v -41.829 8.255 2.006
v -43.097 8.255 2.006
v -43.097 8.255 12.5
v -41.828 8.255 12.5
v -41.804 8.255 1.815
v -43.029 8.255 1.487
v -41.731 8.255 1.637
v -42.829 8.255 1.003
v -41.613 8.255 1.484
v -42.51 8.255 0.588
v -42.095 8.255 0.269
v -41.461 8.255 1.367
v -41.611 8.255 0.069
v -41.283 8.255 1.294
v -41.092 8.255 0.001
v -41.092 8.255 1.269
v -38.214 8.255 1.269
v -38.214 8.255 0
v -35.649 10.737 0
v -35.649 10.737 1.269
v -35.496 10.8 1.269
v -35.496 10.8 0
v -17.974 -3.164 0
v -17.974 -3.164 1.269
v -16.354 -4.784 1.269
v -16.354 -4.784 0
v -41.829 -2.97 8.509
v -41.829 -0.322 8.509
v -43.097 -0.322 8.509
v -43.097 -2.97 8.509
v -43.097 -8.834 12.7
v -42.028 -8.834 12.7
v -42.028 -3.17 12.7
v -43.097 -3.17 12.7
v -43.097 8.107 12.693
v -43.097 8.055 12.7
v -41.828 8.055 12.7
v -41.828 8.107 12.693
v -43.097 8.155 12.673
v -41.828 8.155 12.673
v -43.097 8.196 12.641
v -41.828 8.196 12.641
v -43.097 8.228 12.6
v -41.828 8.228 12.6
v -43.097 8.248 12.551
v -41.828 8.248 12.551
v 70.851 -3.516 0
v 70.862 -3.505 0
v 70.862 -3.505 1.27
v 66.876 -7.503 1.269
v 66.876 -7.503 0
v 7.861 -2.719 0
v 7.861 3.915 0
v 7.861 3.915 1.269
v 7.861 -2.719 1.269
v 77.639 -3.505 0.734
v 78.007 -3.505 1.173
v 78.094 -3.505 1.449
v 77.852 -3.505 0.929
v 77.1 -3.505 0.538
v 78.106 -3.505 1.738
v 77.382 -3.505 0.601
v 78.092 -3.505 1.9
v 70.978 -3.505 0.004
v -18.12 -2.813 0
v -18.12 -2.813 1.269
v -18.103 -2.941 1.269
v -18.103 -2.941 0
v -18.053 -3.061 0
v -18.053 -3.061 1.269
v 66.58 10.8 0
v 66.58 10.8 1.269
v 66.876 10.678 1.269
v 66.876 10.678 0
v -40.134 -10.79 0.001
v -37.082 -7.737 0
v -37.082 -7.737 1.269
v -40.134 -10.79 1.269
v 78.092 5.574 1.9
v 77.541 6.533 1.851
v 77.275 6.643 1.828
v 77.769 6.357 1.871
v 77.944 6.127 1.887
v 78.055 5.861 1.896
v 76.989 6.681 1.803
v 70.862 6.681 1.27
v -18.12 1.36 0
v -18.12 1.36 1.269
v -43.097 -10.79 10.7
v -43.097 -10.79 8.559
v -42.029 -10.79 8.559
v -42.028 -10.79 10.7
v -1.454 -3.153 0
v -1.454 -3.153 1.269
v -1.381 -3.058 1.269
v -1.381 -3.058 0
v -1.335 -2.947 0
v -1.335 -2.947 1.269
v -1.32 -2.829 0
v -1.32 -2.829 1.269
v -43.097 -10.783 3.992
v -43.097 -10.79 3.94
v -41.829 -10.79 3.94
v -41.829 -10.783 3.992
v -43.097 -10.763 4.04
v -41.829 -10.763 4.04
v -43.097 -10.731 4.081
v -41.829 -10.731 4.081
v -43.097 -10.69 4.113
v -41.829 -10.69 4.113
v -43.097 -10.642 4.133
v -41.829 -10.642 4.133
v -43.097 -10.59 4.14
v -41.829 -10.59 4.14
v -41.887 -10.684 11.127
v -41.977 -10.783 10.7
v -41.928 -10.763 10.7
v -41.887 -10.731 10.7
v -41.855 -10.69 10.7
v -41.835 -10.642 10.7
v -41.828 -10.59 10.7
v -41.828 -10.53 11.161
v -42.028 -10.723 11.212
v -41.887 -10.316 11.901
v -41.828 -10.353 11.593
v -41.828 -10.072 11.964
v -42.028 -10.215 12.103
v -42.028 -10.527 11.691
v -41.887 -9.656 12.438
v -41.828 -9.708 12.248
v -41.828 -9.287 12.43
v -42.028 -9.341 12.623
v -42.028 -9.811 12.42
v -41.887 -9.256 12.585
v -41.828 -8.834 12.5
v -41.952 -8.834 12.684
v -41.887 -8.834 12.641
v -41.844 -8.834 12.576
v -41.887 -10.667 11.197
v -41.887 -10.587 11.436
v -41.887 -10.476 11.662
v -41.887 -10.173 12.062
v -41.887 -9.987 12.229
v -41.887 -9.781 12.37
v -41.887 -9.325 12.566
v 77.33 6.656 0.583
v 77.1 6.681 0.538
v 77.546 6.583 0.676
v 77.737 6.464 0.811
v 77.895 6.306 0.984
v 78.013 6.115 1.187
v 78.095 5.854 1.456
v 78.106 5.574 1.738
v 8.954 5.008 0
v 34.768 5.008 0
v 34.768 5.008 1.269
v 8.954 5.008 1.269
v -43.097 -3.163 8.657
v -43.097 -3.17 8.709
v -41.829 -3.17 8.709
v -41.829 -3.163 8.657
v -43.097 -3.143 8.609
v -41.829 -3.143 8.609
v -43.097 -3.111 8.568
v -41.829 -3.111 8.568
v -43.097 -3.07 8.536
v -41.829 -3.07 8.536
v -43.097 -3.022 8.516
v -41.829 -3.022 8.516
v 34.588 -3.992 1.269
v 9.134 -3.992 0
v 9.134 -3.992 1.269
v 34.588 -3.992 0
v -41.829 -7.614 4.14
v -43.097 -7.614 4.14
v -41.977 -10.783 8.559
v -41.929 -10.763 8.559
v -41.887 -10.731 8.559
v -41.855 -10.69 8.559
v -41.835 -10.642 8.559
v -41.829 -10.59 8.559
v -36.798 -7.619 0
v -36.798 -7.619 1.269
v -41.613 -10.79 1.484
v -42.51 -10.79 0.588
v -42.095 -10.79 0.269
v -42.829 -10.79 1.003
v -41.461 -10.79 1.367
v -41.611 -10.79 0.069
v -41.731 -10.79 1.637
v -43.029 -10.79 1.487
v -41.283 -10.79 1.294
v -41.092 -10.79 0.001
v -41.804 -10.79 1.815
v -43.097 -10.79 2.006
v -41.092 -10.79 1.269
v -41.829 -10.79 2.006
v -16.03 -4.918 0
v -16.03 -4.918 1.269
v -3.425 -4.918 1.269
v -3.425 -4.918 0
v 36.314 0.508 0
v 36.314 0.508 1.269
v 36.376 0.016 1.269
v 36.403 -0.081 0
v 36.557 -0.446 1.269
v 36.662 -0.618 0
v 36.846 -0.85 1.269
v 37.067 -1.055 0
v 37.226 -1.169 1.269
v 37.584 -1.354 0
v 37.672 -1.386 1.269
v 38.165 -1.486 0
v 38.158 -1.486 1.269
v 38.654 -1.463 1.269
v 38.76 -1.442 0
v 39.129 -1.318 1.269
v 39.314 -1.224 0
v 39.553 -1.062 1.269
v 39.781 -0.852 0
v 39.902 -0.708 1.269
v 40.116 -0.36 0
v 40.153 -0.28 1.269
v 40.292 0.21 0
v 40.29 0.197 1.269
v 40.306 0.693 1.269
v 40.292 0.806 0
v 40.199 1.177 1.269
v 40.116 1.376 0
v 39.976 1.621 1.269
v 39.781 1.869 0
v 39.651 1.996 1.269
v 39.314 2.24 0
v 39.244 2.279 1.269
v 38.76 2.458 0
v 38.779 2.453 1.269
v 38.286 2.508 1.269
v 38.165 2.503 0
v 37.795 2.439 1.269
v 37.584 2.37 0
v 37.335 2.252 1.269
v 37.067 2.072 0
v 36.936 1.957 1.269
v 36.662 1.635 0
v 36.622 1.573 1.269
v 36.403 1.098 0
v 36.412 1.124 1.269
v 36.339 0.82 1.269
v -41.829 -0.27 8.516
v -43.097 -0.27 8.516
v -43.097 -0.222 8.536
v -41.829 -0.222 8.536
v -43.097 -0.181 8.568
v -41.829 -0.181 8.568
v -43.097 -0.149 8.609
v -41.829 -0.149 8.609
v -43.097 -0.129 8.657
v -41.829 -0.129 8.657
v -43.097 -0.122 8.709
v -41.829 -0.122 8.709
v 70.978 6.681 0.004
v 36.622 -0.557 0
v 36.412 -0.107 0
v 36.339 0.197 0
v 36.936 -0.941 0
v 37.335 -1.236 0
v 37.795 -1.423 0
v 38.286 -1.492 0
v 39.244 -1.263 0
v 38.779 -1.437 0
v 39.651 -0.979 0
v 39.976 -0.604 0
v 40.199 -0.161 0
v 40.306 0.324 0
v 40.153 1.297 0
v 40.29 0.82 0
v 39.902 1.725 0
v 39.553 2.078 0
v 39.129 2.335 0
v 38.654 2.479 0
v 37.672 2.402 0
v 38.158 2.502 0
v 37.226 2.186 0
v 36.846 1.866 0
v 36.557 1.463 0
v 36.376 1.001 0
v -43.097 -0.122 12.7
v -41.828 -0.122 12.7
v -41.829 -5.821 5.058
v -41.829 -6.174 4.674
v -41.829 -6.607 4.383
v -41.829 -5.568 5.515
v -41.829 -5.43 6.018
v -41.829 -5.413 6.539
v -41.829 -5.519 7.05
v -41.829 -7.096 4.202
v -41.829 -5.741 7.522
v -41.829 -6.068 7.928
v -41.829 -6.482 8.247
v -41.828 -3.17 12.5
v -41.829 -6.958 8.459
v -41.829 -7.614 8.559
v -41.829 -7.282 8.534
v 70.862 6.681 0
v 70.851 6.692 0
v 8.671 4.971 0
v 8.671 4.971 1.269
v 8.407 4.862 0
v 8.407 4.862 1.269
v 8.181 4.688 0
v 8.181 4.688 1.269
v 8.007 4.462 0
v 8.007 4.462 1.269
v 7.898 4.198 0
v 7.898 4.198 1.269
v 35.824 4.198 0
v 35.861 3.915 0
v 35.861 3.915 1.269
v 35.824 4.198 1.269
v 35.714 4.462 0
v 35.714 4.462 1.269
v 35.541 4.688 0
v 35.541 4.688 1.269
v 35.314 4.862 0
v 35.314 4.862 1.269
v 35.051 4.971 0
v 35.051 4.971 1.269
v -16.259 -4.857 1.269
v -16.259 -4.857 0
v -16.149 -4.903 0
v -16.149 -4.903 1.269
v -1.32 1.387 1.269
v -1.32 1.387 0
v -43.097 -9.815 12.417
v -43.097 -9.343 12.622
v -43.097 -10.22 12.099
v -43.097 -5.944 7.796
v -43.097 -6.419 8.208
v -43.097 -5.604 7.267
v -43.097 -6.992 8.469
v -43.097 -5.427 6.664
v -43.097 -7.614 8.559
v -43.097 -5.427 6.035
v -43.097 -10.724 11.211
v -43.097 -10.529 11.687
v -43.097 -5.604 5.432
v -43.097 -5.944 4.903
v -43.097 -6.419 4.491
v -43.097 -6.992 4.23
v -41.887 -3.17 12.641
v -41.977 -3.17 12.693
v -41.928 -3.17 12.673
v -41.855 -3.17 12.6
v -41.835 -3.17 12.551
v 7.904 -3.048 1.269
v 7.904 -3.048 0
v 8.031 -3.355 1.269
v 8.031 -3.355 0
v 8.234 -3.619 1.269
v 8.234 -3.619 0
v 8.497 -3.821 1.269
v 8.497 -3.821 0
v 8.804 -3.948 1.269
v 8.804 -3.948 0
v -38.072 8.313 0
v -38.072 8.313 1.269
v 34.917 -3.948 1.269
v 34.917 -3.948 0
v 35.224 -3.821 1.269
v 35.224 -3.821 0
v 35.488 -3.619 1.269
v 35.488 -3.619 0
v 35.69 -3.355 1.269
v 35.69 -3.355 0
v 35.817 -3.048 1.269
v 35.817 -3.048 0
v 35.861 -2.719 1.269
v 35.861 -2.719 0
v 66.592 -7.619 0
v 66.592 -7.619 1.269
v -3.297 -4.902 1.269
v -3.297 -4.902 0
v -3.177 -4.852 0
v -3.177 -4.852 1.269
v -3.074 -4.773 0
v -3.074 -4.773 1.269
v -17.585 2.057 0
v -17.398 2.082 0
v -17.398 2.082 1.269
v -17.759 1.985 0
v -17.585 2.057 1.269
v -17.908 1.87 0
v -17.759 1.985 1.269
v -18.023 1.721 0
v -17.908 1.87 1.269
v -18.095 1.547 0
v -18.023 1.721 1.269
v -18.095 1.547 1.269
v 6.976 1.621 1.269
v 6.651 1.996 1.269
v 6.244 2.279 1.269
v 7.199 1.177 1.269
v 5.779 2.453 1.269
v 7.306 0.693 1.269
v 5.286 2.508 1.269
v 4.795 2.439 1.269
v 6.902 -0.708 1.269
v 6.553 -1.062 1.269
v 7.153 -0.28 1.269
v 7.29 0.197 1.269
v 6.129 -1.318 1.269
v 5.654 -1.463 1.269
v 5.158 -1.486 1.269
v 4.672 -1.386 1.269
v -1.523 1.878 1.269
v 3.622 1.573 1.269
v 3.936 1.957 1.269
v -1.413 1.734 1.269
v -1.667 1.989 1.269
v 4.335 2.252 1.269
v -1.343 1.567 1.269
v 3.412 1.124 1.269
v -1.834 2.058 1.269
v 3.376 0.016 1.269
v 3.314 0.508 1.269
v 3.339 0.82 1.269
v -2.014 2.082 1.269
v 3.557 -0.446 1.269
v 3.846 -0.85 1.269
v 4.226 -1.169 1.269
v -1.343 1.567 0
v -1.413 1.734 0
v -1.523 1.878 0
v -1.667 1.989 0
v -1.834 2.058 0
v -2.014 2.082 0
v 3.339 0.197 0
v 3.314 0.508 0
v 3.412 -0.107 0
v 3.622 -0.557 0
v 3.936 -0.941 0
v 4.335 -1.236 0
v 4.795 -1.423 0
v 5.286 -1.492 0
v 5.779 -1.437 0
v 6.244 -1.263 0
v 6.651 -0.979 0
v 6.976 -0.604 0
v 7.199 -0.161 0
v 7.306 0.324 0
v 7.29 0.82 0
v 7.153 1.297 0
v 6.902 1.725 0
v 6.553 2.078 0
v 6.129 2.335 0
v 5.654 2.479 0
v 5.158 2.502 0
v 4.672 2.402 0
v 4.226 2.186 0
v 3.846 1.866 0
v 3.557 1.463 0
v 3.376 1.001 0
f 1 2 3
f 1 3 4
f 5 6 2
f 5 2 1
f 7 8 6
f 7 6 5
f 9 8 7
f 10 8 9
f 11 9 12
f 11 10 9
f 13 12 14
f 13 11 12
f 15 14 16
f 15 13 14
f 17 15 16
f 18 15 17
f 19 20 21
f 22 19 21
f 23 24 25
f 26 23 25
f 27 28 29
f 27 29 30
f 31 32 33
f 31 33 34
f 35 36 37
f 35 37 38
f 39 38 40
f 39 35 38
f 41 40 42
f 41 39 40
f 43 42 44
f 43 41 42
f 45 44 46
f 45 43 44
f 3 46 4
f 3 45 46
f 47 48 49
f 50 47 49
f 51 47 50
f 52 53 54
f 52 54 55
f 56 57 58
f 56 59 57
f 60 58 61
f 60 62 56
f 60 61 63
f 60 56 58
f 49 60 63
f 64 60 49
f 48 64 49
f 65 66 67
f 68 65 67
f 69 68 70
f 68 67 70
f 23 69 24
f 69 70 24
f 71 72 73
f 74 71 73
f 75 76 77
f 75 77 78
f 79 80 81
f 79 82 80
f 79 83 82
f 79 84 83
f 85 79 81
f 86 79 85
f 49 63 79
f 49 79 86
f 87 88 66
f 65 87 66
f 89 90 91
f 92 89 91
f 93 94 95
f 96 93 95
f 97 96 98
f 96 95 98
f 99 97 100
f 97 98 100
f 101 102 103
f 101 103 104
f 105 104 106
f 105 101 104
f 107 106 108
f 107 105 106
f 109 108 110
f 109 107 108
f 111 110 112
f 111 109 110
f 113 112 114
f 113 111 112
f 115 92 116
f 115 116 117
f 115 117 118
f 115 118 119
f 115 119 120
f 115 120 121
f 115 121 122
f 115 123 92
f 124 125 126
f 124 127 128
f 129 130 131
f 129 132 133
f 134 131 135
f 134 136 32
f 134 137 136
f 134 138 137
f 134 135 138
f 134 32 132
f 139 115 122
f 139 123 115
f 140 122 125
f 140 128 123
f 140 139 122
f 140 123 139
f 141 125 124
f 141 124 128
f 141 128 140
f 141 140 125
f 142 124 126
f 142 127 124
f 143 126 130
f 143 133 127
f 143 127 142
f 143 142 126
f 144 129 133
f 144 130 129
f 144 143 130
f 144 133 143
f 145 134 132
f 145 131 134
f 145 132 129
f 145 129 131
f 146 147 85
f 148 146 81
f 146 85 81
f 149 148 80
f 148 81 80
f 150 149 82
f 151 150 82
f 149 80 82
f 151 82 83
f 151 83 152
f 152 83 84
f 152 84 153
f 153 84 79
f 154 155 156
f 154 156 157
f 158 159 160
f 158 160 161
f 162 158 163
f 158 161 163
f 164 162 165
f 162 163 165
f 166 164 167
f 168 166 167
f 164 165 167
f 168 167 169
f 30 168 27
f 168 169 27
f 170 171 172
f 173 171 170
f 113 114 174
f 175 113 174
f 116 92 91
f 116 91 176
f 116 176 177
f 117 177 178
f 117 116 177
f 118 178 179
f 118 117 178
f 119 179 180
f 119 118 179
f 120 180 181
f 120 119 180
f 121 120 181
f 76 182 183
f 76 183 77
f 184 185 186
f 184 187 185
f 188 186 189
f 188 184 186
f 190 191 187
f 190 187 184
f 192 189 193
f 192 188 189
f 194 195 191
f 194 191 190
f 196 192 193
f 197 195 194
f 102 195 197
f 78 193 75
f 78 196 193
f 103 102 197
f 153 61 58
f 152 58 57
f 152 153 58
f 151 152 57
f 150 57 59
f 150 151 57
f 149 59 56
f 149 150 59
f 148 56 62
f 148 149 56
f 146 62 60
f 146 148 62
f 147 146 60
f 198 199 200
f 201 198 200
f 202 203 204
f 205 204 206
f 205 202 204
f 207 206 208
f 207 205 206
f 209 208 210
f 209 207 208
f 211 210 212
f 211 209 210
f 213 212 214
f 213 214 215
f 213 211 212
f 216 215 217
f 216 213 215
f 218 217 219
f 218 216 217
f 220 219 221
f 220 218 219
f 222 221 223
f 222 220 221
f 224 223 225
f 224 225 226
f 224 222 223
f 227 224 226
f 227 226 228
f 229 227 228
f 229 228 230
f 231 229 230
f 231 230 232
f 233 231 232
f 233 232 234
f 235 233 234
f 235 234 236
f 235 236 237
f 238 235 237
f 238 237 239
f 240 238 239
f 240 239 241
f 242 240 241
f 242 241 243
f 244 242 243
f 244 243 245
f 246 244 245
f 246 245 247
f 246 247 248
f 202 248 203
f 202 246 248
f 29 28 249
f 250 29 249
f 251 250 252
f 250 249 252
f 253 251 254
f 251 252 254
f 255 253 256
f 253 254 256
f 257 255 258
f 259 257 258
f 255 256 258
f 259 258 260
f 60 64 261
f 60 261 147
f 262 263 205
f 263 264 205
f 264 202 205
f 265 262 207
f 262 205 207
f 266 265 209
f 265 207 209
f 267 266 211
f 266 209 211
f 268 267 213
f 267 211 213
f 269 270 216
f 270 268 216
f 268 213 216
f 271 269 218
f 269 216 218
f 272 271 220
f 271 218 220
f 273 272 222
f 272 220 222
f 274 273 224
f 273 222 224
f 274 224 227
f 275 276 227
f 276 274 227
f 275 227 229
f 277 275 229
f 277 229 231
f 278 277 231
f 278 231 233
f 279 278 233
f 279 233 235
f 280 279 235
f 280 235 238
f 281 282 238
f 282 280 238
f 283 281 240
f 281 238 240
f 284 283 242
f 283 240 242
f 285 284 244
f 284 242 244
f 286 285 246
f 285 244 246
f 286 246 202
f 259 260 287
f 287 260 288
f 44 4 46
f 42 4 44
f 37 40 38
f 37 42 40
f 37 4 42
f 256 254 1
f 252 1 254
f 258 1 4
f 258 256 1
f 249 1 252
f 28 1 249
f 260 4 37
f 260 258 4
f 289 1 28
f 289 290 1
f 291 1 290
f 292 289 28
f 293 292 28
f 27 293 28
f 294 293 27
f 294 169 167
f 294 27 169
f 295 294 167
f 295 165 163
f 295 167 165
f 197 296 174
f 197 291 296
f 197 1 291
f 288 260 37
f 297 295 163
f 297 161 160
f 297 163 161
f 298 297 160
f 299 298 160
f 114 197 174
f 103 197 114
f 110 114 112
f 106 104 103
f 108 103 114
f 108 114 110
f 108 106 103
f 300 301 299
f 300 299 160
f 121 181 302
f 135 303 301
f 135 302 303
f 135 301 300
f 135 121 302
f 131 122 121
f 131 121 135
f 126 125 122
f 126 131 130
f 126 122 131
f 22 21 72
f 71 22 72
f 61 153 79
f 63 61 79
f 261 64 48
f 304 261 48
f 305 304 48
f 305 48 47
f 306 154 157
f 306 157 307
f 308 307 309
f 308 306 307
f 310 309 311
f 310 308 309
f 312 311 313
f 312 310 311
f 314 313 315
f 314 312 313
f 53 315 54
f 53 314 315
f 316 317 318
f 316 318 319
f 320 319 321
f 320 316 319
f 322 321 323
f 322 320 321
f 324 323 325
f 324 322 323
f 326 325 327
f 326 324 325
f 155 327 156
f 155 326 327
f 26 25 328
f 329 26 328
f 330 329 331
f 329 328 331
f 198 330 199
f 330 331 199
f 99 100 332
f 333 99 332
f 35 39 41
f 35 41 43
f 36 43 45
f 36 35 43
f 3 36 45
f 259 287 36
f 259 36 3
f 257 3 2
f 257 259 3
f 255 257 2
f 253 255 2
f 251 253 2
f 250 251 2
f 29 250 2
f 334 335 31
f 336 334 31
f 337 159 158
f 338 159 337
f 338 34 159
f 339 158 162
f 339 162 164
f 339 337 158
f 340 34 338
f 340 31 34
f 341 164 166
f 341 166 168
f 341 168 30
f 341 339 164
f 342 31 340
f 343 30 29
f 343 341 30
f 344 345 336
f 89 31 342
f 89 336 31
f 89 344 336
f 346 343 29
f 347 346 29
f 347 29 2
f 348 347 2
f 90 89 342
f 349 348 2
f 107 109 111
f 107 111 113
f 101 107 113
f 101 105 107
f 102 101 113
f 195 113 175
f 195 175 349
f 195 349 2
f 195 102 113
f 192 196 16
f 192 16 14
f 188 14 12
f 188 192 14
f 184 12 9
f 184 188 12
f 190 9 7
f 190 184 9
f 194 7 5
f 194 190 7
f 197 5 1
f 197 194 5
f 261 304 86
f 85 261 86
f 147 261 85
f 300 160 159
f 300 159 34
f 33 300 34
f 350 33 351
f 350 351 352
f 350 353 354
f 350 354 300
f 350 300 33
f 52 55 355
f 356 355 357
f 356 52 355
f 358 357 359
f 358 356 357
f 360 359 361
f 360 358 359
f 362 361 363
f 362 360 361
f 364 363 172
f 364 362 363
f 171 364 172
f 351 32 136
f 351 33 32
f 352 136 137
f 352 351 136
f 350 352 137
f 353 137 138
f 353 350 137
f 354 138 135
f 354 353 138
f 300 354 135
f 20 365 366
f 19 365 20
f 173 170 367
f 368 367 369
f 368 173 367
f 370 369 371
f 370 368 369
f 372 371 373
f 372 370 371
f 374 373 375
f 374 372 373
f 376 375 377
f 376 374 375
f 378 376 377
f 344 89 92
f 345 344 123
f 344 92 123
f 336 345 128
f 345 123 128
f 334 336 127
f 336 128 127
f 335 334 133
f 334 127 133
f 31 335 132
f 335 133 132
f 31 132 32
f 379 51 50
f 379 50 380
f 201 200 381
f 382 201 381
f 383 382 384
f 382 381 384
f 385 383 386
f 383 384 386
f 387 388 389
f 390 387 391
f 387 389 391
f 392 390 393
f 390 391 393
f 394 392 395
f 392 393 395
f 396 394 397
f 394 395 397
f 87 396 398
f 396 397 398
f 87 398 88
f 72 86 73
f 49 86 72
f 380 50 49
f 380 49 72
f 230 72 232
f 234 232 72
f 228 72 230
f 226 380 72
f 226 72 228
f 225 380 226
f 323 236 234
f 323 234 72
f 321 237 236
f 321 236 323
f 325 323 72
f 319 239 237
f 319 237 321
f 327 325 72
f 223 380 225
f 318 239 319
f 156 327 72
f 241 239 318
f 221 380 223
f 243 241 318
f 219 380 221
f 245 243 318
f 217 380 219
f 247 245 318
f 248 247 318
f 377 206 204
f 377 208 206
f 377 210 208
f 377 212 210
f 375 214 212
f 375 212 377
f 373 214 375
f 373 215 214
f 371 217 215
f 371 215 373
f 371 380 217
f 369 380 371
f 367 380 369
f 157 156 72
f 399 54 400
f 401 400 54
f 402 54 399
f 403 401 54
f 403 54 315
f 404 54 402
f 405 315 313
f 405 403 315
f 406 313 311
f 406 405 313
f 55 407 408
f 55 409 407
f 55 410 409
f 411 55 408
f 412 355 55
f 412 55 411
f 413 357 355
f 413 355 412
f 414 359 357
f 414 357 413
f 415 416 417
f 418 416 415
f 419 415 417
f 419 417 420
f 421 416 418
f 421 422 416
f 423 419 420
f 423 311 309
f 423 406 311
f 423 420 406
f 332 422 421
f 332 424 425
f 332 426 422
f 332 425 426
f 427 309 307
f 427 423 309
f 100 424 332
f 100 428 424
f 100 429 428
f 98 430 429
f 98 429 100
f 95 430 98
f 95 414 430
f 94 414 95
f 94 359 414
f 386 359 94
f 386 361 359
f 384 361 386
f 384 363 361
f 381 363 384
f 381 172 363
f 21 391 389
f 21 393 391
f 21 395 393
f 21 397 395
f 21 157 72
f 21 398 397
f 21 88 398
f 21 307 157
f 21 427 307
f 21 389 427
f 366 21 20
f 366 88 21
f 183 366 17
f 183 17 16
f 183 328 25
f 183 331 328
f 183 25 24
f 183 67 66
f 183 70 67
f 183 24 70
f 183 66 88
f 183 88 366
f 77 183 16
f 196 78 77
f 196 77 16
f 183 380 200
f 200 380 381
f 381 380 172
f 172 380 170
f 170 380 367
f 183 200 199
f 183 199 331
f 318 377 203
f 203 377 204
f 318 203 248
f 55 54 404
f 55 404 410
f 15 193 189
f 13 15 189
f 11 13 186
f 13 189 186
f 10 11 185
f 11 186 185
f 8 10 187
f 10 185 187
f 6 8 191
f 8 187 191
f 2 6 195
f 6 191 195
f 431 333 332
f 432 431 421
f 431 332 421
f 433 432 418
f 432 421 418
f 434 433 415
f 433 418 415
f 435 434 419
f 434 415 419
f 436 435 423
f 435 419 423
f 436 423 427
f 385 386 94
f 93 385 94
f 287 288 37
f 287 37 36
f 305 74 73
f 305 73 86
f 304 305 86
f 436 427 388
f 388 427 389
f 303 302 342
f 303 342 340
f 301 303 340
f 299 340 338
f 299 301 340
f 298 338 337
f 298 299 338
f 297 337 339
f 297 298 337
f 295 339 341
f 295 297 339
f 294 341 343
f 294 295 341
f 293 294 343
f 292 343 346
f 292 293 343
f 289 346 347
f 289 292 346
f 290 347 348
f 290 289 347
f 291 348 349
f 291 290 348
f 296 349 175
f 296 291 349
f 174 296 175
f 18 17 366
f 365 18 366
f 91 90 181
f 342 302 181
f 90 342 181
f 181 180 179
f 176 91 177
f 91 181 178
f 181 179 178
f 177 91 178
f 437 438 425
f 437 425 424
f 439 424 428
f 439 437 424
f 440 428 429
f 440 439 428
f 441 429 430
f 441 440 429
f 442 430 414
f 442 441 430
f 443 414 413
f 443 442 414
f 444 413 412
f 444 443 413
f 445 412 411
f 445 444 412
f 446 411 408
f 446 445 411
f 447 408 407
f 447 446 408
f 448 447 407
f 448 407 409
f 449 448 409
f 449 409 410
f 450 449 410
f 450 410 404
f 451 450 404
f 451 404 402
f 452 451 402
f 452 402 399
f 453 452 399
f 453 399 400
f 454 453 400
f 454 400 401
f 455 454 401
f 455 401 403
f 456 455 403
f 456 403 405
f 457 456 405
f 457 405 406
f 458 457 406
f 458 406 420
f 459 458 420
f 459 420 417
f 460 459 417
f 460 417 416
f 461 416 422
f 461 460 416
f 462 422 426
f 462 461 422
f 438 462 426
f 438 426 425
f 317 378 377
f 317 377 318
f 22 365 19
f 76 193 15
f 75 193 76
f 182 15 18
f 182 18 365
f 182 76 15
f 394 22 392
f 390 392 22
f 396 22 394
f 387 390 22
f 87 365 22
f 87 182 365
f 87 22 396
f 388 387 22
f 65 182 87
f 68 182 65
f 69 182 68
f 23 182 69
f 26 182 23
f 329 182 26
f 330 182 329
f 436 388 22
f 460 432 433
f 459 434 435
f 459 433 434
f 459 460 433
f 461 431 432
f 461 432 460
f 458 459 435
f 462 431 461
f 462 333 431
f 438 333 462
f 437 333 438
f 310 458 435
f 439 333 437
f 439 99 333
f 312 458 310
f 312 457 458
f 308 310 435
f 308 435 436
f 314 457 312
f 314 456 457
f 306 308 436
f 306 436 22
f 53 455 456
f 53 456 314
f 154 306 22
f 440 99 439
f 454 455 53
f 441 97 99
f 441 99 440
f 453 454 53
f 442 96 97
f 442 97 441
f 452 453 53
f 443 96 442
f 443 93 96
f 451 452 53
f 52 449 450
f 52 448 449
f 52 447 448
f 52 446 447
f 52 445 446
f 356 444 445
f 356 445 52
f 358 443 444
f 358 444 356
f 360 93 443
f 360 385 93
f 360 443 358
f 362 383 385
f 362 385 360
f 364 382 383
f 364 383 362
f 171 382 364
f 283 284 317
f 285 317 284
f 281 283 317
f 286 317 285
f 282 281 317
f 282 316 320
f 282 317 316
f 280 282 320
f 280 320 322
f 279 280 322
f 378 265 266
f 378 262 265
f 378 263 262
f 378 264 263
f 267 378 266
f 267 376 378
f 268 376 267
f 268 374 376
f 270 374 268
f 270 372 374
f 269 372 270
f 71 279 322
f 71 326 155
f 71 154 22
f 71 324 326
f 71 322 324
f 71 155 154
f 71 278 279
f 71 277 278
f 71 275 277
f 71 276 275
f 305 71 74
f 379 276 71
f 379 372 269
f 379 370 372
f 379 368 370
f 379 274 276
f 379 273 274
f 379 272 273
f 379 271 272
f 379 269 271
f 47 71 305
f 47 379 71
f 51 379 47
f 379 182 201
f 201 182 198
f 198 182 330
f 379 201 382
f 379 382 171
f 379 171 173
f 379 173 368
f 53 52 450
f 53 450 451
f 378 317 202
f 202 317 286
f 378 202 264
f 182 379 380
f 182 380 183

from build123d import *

# Parameters (mm, degrees)
PAD_DEPTH            = 21.59
POCKET_DEPTH         = 0.001476
POCKET_DEPTH_BACK    = -12.700524
SKETCH002_W          = 3.048
SKETCH002_H          = 5.191
POCKET001_DEPTH      = 121.30125
POCKET001_DEPTH_BACK = -0.00125
FILLET_R             = 0.2
FILLET001_R          = 1.107
SKETCH003_R          = 2
POCKET002_DEPTH      = 5
BODY_PLACEMENT_ANGLE = 180


with BuildPart() as part:
    # Sketch → Pad (new body)
    with BuildSketch(Plane.XZ.offset(-10.79)):
        with BuildLine():
            Line((-60.53925, 1.899524), (-53.30925, 1.269524))
            Line((-53.30925, 1.269524), (58.64525, 1.268524))
            ThreePointArc((58.64525, 1.268524), (59.166388, 1.484386), (59.38225, 2.005524))
            Line((59.38225, 2.005524), (59.38125, 12.699524))
            Line((59.38125, 12.699524), (60.65025, 12.699524))
            Line((60.65025, 12.699524), (60.65025, 2.005524))
            ThreePointArc((58.64525, 0.000524), (60.062999, 0.587775), (60.65025, 2.005524))
            Line((58.64525, 0.000524), (-53.29825, -0.000476))
            Line((-53.42525, 0.003524), (-53.29825, -0.000476))
            Line((-53.42525, 0.003524), (-60.65025, 0.634524))
            Line((-60.65025, 0.634524), (-60.53925, 1.899524))
        make_face()
    extrude(amount=PAD_DEPTH)

    # Sketch001 → Pocket (cut, two sides)
    with BuildSketch(Plane(origin=(0, 30, 0), x_dir=(1, 0, 0), z_dir=(0, 0, 1))) as pocket_sk:
        Polygon((-65.65025, -36.681), (-65.65025, -44.909), (-47.05075, -44.909), (-47.05075, -41.614), (-49.32275, -40.678), (-53.30925, -36.681), align=None)
        Polygon((-53.30925, -26.495), (-49.32275, -22.497), (-49.03875, -22.381), (54.35125, -22.381), (54.63525, -22.263), (57.69221, -19.205), (57.69221, -11.915), (-65.65025, -11.915), (-65.65025, -26.495), align=None)
        Polygon((52.07425, -41.201), (52.07425, -46.483), (64.41525, -46.483), (64.41525, -38.255), (55.76725, -38.255), (55.62525, -38.313), (53.20225, -40.737), align=None)
    extrude(amount=-POCKET_DEPTH, mode=Mode.SUBTRACT)
    extrude(pocket_sk.sketch, amount=-POCKET_DEPTH_BACK, mode=Mode.SUBTRACT)

    # Sketch002 → Pocket001 (cut, two sides)
    with BuildSketch(Plane(origin=(60.65, 1.263, 0), x_dir=(0, 1, 0), z_dir=(1, 0, 0))) as pocket001_sk:
        with BuildLine():
            Line((6.351, 8.559), (10.527, 8.559))
            Line((10.527, 4.14), (10.527, 8.559))
            Line((10.527, 4.14), (6.351, 4.14))
            ThreePointArc((6.351, 8.559), (4.1415, 6.3495), (6.351, 4.14))
        make_face()
        with Locations((0.383, 11.1045)):
            Rectangle(SKETCH002_W, SKETCH002_H)
        with BuildLine():
            ThreePointArc((9.527, 10.7), (8.941214, 12.114214), (7.527, 12.7))
            Line((7.527, 12.7), (7.527, 13.7))
            Line((7.527, 13.7), (10.527, 13.7))
            Line((10.527, 10.7), (10.527, 13.7))
            Line((9.527, 10.7), (10.527, 10.7))
        make_face()
    extrude(amount=-POCKET001_DEPTH, mode=Mode.SUBTRACT)
    extrude(pocket001_sk.sketch, amount=-POCKET001_DEPTH_BACK, mode=Mode.SUBTRACT)

    # Fillet
    fillet_edges = [part.edges().sort_by_distance(p)[0] for p in [
        (60.015718, 10.79, 10.7),
        (60.016025, 10.79, 4.14),
        (60.015821, 3.17, 8.509),
        (59.381537, 10.79, 9.6295),
        (60.015821, 0.122, 8.509),
        (60.015819, 7.614, 8.559),
        (60.01575, -8.255, 12.699524),
    ]]
    fillet(fillet_edges, radius=FILLET_R)

    # Fillet001
    fillet001_edges = [part.edges().sort_by_distance(p)[0] for p in [
        (-60.59475, -6.681, 1.267024),
        (-60.65025, -1.588, 0.634524),
    ]]
    fillet(fillet001_edges, radius=FILLET001_R)

    # Sketch003 (on XY_Plane of Origin) → Pocket002 (cut, symmetric)
    with BuildSketch(Plane.XY):
        with Locations((-20.761466, -0.508223)):
            Circle(SKETCH003_R)
        with Locations((12.238534, -0.508223)):
            Circle(SKETCH003_R)
        with BuildLine():
            Line((-17.215014, -5.008223), (8.599402, -5.008223))
            ThreePointArc((8.599402, -5.008223), (9.372123, -4.688152), (9.692194, -3.915431))
            Line((9.692194, -3.915431), (9.692194, 2.718985))
            ThreePointArc((9.692194, 2.718985), (9.319402, 3.618985), (8.419402, 3.991777))
            Line((8.419402, 3.991777), (-17.035014, 3.991777))
            ThreePointArc((-17.035014, 3.991777), (-17.935014, 3.618985), (-18.307806, 2.718985))
            Line((-18.307806, 2.718985), (-18.307806, -3.915431))
            ThreePointArc((-18.307806, -3.915431), (-17.987735, -4.688152), (-17.215014, -5.008223))
        make_face()
        with BuildLine():
            Line((19.567188, -2.081534), (34.951188, -2.081534))
            ThreePointArc((34.951188, -2.081534), (35.461442, -1.87018), (35.672797, -1.359925))
            Line((35.672797, -1.359925), (35.672797, 2.812811))
            ThreePointArc((35.672797, 2.812811), (35.635004, 3.002811), (35.527377, 3.163885))
            Line((35.527377, 3.163885), (33.907086, 4.784176))
            ThreePointArc((33.907086, 4.784176), (33.75834, 4.883565), (33.582882, 4.918466))
            Line((33.582882, 4.918466), (20.978451, 4.918466))
            ThreePointArc((20.978451, 4.918466), (20.788451, 4.880672), (20.627377, 4.773046))
            Line((20.627377, 4.773046), (19.007087, 3.152755))
            ThreePointArc((19.007087, 3.152755), (18.907698, 3.004009), (18.872797, 2.828551))
            Line((18.872797, 2.828551), (18.872797, -1.387144))
            ThreePointArc((18.872797, -1.387144), (19.076179, -1.878152), (19.567188, -2.081534))
        make_face()
    extrude(amount=POCKET002_DEPTH, both=True, mode=Mode.SUBTRACT)


with BuildPart() as part_1:
    # Body placement: moved
    add(part.part.moved(Location((17.553, 0, 0))).rotate(Axis((17.553, 0, 0), (0, 0, 1)), BODY_PLACEMENT_ANGLE))


solid = part_1.part
